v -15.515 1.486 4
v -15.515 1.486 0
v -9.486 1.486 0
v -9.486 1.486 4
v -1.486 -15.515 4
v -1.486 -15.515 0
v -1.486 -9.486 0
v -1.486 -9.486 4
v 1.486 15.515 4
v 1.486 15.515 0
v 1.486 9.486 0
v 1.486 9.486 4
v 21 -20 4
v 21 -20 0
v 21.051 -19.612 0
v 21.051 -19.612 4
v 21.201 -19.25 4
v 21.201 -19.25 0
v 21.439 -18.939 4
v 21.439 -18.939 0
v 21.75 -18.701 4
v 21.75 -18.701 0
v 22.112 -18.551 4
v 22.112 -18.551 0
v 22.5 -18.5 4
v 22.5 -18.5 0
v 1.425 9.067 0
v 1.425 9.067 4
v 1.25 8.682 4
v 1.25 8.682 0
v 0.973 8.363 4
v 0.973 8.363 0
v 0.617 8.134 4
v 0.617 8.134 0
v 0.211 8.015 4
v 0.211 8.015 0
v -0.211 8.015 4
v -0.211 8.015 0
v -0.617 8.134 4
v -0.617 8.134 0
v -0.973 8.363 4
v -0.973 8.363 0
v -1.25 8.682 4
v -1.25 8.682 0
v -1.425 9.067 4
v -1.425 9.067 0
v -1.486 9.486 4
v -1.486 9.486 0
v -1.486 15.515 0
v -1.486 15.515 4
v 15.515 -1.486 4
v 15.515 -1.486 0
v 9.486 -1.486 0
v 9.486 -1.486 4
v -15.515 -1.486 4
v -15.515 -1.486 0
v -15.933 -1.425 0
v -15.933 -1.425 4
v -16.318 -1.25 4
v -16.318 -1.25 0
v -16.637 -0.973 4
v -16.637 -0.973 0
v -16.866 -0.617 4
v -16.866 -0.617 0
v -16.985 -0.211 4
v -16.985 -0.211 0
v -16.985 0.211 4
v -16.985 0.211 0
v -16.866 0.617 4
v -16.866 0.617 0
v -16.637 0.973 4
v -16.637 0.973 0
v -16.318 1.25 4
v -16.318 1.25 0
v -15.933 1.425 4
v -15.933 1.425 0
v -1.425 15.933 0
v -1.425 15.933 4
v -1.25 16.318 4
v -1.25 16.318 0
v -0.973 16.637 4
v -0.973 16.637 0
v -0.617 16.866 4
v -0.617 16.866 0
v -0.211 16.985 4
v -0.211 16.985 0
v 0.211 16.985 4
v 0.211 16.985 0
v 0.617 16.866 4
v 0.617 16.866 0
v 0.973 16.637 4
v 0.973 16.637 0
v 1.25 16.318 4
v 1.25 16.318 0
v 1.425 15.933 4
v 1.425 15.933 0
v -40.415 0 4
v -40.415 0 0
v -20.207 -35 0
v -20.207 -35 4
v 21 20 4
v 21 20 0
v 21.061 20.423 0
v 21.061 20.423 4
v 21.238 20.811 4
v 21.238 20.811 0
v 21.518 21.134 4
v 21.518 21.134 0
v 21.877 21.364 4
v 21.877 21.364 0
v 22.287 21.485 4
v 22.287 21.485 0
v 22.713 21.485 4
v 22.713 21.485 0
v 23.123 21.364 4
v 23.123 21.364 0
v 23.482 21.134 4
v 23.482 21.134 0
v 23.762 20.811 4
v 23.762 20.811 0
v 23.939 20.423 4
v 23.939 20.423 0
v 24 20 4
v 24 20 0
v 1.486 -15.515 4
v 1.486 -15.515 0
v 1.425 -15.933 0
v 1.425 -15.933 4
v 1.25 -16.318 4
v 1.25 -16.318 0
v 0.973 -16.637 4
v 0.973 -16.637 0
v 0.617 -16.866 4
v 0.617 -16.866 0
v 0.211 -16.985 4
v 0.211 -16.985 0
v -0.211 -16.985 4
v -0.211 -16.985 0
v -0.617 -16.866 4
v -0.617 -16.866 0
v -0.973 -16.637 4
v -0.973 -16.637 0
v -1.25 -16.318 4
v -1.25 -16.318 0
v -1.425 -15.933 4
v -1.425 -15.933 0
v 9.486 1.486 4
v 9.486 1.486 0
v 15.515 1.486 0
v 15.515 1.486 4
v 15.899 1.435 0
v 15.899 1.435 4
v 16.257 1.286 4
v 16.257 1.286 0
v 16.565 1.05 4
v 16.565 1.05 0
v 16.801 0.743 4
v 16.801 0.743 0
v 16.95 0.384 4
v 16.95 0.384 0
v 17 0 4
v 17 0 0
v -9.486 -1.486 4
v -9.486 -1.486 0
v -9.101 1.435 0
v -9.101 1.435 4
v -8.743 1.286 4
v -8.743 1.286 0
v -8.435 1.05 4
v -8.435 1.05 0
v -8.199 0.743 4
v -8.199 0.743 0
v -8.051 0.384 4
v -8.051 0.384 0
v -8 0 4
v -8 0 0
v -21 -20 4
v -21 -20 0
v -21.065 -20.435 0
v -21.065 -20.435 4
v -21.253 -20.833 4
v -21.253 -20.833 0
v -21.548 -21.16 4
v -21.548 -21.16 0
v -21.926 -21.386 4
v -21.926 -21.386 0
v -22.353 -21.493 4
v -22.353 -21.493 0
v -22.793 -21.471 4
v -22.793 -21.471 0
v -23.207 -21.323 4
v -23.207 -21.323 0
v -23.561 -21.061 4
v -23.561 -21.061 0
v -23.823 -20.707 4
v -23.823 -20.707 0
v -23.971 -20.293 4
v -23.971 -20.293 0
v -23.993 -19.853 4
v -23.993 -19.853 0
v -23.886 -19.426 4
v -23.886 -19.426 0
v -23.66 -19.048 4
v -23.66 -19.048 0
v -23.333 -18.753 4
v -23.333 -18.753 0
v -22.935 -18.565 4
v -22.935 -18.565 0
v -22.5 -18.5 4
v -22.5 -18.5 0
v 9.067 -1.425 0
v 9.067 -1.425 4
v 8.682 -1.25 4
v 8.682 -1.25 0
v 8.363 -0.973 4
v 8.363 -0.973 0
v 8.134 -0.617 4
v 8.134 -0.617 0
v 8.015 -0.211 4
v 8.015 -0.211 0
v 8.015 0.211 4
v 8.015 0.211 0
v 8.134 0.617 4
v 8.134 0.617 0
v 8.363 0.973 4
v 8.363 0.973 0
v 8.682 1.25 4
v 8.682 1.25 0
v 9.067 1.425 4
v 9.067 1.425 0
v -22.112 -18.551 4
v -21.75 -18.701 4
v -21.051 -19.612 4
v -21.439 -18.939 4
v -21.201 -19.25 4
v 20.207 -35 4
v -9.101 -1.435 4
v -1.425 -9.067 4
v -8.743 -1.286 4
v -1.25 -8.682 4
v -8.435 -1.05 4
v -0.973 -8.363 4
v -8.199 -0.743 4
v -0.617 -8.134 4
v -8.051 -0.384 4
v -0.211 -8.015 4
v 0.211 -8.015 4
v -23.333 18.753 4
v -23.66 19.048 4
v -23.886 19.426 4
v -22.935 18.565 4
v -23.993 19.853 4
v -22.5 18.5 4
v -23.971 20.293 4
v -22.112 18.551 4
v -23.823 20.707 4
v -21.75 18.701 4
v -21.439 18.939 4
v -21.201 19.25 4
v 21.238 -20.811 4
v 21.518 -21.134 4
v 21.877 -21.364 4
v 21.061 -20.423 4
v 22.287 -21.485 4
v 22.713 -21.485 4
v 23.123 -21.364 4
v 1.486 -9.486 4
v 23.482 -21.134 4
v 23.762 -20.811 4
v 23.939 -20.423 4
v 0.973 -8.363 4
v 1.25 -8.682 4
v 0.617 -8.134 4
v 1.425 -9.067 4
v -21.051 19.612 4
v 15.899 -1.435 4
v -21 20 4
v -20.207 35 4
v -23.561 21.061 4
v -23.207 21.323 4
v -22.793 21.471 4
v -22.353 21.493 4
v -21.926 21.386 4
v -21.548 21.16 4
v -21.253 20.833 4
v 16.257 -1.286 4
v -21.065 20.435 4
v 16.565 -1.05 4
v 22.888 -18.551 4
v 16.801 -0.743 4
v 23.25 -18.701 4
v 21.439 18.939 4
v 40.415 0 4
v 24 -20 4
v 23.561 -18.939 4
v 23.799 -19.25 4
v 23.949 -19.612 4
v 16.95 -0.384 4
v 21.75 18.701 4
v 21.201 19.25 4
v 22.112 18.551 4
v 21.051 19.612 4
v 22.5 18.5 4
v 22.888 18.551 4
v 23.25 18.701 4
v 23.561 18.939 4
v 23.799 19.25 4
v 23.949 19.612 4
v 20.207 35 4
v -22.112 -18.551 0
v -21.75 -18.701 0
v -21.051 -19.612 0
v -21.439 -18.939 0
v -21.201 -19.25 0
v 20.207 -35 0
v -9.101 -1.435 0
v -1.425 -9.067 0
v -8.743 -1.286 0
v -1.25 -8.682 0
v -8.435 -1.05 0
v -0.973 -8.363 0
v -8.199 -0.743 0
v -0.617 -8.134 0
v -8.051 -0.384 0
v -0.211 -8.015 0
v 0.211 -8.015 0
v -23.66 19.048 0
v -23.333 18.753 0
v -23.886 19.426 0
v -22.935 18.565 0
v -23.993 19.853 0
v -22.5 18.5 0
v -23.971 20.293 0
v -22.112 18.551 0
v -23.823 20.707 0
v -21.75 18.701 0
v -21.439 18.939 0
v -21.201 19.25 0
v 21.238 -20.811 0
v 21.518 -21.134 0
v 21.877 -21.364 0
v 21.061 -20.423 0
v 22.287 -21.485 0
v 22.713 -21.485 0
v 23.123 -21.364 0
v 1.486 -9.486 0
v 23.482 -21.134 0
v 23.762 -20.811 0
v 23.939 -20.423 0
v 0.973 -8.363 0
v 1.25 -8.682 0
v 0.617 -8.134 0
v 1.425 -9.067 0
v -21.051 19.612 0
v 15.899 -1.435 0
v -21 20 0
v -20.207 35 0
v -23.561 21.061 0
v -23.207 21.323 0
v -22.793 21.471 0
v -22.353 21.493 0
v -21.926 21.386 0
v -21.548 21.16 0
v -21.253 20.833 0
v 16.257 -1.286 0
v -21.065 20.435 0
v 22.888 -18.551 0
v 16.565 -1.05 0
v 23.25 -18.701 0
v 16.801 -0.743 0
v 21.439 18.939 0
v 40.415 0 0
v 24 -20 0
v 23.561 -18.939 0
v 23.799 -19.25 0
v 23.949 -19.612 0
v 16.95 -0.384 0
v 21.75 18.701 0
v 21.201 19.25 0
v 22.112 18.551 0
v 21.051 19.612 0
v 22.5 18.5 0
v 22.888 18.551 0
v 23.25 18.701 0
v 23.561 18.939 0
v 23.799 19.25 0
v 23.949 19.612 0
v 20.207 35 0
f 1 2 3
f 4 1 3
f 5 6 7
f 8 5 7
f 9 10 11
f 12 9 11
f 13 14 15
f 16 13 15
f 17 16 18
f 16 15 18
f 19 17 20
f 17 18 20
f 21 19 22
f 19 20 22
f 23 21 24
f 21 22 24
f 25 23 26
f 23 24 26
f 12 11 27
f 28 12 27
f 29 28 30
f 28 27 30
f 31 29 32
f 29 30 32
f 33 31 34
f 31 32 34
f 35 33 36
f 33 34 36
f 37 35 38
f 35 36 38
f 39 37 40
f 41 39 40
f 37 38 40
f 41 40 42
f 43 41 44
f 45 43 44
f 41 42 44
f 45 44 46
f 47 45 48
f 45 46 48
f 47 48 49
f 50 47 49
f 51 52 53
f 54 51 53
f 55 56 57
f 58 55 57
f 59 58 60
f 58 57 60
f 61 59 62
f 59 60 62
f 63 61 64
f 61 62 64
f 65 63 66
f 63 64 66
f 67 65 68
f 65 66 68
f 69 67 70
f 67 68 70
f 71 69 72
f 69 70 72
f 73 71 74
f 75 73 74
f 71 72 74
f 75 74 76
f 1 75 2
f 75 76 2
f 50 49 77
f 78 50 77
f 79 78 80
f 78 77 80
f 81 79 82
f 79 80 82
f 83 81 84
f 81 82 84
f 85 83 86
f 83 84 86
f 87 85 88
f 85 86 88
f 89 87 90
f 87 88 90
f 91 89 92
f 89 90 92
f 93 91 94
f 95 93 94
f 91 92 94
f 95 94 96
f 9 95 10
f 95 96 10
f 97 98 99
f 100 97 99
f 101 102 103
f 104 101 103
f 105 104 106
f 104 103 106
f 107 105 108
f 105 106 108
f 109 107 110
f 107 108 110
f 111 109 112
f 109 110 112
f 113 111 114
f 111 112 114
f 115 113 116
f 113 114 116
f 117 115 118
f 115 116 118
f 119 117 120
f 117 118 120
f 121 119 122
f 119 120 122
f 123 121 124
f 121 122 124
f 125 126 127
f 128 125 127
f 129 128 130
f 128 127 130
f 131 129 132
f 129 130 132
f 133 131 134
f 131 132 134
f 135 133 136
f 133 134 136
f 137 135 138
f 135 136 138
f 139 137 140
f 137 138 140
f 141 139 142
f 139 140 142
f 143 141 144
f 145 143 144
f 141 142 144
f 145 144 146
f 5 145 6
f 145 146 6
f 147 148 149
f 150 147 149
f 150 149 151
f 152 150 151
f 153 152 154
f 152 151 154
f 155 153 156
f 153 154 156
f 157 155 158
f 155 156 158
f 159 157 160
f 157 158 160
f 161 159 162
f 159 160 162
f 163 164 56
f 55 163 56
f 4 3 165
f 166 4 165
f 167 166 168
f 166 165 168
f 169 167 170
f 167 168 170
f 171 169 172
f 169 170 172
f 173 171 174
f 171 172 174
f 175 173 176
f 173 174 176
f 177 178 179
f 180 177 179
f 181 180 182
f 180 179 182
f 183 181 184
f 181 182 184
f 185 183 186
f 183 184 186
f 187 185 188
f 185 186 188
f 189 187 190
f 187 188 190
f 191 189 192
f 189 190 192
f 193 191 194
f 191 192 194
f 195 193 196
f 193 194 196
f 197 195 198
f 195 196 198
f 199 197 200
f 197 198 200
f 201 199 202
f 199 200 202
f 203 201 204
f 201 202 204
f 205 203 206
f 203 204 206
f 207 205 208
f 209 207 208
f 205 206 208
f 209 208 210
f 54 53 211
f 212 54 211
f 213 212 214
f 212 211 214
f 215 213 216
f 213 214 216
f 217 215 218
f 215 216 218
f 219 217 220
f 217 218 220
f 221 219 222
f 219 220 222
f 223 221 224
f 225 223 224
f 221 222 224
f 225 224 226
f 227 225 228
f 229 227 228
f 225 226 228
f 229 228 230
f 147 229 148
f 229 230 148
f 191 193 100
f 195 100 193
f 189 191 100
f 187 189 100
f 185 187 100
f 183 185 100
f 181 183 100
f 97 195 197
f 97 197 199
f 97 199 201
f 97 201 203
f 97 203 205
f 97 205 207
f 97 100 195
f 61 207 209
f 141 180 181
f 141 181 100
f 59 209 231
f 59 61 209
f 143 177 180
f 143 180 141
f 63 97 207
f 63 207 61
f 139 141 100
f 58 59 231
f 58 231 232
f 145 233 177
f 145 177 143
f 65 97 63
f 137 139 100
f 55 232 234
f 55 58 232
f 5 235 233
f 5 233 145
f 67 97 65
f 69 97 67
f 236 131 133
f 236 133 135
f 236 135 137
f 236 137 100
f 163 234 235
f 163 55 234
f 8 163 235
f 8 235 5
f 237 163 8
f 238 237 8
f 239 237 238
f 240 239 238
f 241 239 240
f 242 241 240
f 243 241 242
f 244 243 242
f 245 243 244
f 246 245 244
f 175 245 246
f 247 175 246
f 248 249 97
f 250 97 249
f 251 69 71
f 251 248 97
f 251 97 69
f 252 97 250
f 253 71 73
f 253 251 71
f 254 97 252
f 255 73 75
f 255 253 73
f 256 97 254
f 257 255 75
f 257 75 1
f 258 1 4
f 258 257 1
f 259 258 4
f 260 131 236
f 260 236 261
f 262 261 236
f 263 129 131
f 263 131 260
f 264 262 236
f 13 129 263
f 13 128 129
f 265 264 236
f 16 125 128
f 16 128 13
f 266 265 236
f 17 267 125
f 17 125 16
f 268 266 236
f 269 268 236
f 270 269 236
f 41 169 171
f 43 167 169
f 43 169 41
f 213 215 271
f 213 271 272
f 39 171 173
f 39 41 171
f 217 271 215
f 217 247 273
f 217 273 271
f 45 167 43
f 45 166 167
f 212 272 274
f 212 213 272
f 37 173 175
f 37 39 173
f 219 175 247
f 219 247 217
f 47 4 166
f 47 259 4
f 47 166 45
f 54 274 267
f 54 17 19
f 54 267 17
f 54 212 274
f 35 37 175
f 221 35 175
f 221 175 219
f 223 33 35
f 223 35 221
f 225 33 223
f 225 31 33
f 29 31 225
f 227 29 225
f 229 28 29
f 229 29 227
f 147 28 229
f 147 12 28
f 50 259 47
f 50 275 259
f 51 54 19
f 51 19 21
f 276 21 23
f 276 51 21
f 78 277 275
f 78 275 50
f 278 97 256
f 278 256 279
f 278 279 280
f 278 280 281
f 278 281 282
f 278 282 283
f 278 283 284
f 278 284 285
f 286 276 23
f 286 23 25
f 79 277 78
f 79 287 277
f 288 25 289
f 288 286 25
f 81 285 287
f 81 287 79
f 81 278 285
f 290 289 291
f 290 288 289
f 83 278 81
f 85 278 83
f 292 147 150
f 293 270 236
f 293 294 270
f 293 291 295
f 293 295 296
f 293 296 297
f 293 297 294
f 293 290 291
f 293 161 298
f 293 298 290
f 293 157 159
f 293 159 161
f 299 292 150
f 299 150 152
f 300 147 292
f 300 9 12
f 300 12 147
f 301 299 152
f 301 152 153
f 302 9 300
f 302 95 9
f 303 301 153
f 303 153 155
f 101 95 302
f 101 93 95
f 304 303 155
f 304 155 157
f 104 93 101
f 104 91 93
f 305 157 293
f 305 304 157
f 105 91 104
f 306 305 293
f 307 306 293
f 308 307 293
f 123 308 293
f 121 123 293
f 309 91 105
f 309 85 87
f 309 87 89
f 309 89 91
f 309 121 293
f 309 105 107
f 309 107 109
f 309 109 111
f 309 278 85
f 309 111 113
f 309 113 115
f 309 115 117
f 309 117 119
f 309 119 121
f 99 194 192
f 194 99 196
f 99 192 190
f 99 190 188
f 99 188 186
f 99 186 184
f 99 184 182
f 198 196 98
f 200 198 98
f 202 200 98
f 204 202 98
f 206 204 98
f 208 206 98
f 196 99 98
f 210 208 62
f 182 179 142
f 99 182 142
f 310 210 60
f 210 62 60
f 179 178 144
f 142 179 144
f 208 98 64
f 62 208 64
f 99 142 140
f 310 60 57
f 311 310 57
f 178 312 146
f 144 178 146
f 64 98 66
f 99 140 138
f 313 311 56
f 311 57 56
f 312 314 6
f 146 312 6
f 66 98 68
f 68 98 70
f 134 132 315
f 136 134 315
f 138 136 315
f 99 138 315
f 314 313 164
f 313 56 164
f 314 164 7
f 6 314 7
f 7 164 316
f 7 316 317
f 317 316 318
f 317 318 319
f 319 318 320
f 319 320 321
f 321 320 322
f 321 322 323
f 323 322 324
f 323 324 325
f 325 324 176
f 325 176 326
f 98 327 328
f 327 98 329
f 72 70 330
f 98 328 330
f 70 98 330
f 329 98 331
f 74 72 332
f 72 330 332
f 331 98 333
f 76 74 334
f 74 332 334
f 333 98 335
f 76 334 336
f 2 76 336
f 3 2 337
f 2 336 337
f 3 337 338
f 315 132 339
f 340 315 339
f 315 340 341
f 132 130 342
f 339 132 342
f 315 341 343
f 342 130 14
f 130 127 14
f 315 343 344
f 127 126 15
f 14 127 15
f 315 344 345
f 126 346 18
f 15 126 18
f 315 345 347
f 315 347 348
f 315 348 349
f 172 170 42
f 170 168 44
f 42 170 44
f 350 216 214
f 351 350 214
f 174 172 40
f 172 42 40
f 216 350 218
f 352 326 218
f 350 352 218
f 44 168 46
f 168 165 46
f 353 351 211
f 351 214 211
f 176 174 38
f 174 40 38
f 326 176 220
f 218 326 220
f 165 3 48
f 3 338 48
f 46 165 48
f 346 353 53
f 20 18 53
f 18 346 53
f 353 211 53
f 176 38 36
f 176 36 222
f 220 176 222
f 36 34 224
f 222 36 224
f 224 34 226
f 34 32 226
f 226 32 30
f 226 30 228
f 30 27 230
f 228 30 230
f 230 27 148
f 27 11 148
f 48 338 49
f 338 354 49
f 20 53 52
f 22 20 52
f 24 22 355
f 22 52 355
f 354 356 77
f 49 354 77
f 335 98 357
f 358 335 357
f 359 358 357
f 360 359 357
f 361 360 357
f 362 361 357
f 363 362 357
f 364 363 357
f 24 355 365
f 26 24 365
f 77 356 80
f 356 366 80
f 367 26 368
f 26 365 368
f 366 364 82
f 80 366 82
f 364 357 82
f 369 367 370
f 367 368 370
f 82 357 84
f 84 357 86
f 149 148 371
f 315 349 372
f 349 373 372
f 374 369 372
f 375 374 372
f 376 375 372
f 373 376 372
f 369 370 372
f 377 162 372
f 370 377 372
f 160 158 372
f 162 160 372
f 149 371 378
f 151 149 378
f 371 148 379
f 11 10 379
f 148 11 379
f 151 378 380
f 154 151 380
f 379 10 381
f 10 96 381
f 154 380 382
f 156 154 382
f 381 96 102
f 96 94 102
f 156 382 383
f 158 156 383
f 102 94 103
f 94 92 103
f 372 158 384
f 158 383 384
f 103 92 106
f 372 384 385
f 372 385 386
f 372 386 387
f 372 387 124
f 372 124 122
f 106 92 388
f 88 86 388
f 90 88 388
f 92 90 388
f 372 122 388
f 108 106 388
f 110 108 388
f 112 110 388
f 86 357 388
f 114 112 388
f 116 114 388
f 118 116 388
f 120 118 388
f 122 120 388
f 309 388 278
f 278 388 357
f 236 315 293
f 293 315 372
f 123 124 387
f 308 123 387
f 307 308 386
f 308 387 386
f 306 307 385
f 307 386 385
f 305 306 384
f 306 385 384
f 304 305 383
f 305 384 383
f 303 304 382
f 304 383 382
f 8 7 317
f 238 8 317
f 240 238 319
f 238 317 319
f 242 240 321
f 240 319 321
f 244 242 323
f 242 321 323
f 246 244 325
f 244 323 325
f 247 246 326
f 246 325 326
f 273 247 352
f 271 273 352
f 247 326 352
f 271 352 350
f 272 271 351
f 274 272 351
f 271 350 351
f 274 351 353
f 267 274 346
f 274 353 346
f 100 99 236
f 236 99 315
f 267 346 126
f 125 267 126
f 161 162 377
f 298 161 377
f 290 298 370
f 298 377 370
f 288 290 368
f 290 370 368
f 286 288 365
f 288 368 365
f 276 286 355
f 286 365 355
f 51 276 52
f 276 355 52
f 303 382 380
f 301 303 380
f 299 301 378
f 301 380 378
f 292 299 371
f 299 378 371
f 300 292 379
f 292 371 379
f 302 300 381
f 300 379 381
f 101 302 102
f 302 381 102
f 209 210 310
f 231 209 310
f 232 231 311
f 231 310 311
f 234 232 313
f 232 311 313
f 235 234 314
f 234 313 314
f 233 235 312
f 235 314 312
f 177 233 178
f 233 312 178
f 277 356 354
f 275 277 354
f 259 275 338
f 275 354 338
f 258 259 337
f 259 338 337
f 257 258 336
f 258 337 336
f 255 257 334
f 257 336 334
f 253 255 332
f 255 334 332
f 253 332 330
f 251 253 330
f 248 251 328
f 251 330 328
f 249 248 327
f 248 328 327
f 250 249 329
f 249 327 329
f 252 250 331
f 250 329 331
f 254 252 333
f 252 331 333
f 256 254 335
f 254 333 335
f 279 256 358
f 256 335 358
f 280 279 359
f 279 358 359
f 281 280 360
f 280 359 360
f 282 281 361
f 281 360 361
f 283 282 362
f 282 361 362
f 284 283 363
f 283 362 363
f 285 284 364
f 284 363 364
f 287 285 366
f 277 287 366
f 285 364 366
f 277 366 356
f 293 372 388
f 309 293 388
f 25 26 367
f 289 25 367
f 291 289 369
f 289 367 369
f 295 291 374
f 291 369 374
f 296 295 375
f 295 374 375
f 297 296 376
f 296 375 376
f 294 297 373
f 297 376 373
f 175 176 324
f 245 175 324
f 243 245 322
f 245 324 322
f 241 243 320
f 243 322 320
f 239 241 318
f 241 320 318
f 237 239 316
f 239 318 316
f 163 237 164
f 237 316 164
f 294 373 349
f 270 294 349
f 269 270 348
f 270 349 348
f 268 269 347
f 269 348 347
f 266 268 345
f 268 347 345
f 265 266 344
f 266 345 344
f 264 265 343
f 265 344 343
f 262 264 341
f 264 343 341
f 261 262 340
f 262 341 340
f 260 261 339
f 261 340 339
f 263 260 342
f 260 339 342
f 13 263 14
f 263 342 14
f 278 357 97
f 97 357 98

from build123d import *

# Parameters (mm, degrees)
F0_W     = 2.971
F0_H     = 2.971
F1_DEPTH = 4


with BuildPart() as f1:
    # F0 (on Top) → F1 (new body)
    with BuildSketch(Plane.XY):
        Polygon((-20.2072594216, -35), (20.2072594216, -35), (40.4145188433, 0), (20.2072594216, 35), (-20.2072594216, 35), (-40.4145188433, 0), align=None)
        with BuildLine():
            Line((21, -20), (-21, -20))
            ThreePointArc((-21, -20), (-23.5606601718, -21.0606601718), (-22.5, -18.5))
            Line((-22.5, -18.5), (-22.5, 18.5))
            ThreePointArc((-22.5, 18.5), (-23.5606601718, 21.0606601718), (-21, 20))
            Line((-21, 20), (21, 20))
            ThreePointArc((21, 20), (22.5, 21.5), (24, 20))
            ThreePointArc((24, 20), (23.5606601718, 18.9393398282), (22.5, 18.5))
            Line((22.5, 18.5), (22.5, -18.5))
            ThreePointArc((22.5, -18.5), (23.5606601718, -18.9393398282), (24, -20))
            ThreePointArc((24, -20), (22.5, -21.5), (21, -20))
        make_face(mode=Mode.SUBTRACT)
        with BuildLine():
            ThreePointArc((-22.5, -18.5), (-21.4393398282, -18.9393398282), (-21, -20))
            Line((-21, -20), (21, -20))
            ThreePointArc((21, -20), (21.4393398282, -18.9393398282), (22.5, -18.5))
            Line((22.5, -18.5), (22.5, 18.5))
            ThreePointArc((22.5, 18.5), (21.4393398282, 18.9393398282), (21, 20))
            Line((21, 20), (-21, 20))
            ThreePointArc((-21, 20), (-21.4393398282, 18.9393398282), (-22.5, 18.5))
            Line((-22.5, 18.5), (-22.5, -18.5))
        make_face()
        with BuildLine():
            Line((15.51465, -1.4855), (9.4855, -1.4855))
            Line((9.4855, -1.4855), (1.4855, -1.4855))
            Line((1.4855, -1.4855), (1.4855, -9.4855))
            Line((1.4855, -9.4855), (1.4855, -15.51465))
            ThreePointArc((1.4855, -15.51465), (0, -17.00015), (-1.4855, -15.51465))
            Line((-1.4855, -15.51465), (-1.4855, -9.4855))
            Line((-1.4855, -9.4855), (-1.4855, -1.4855))
            Line((-1.4855, -1.4855), (-9.4855, -1.4855))
            Line((-9.4855, -1.4855), (-15.51465, -1.4855))
            ThreePointArc((-15.51465, -1.4855), (-17.00015, 0), (-15.51465, 1.4855))
            Line((-15.51465, 1.4855), (-9.4855, 1.4855))
            Line((-9.4855, 1.4855), (-1.4855, 1.4855))
            Line((-1.4855, 1.4855), (-1.4855, 9.4855))
            Line((-1.4855, 9.4855), (-1.4855, 15.51465))
            ThreePointArc((-1.4855, 15.51465), (0, 17.00015), (1.4855, 15.51465))
            Line((1.4855, 15.51465), (1.4855, 9.4855))
            Line((1.4855, 9.4855), (1.4855, 1.4855))
            Line((1.4855, 1.4855), (9.4855, 1.4855))
            Line((9.4855, 1.4855), (15.51465, 1.4855))
            ThreePointArc((15.51465, 1.4855), (16.5650571235, 1.0504071235), (17.00015, 0))
            ThreePointArc((17.00015, 0), (16.5650571235, -1.0504071235), (15.51465, -1.4855))
        make_face(mode=Mode.SUBTRACT)
        with BuildLine():
            Line((-1.4855, 1.4855), (1.4855, 1.4855))
            Line((1.4855, 1.4855), (1.4855, 9.4855))
            ThreePointArc((1.4855, 9.4855), (0, 8), (-1.4855, 9.4855))
            Line((-1.4855, 9.4855), (-1.4855, 1.4855))
        make_face()
        with BuildLine():
            Line((-9.4855, -1.4855), (-1.4855, -1.4855))
            Line((-1.4855, -1.4855), (-1.4855, 1.4855))
            Line((-1.4855, 1.4855), (-9.4855, 1.4855))
            ThreePointArc((-9.4855, 1.4855), (-8.4350928765, 1.0504071235), (-8, 0))
            ThreePointArc((-8, 0), (-8.4350928765, -1.0504071235), (-9.4855, -1.4855))
        make_face()
        with BuildLine():
            Line((1.4855, -1.4855), (9.4855, -1.4855))
            ThreePointArc((9.4855, -1.4855), (8, 0), (9.4855, 1.4855))
            Line((9.4855, 1.4855), (1.4855, 1.4855))
            Line((1.4855, 1.4855), (1.4855, -1.4855))
        make_face()
        Rectangle(F0_W, F0_H)
        with BuildLine():
            Line((1.4855, -9.4855), (1.4855, -1.4855))
            Line((1.4855, -1.4855), (-1.4855, -1.4855))
            Line((-1.4855, -1.4855), (-1.4855, -9.4855))
            ThreePointArc((-1.4855, -9.4855), (0, -8), (1.4855, -9.4855))
        make_face()
    extrude(amount=F1_DEPTH)


solid = f1.part
